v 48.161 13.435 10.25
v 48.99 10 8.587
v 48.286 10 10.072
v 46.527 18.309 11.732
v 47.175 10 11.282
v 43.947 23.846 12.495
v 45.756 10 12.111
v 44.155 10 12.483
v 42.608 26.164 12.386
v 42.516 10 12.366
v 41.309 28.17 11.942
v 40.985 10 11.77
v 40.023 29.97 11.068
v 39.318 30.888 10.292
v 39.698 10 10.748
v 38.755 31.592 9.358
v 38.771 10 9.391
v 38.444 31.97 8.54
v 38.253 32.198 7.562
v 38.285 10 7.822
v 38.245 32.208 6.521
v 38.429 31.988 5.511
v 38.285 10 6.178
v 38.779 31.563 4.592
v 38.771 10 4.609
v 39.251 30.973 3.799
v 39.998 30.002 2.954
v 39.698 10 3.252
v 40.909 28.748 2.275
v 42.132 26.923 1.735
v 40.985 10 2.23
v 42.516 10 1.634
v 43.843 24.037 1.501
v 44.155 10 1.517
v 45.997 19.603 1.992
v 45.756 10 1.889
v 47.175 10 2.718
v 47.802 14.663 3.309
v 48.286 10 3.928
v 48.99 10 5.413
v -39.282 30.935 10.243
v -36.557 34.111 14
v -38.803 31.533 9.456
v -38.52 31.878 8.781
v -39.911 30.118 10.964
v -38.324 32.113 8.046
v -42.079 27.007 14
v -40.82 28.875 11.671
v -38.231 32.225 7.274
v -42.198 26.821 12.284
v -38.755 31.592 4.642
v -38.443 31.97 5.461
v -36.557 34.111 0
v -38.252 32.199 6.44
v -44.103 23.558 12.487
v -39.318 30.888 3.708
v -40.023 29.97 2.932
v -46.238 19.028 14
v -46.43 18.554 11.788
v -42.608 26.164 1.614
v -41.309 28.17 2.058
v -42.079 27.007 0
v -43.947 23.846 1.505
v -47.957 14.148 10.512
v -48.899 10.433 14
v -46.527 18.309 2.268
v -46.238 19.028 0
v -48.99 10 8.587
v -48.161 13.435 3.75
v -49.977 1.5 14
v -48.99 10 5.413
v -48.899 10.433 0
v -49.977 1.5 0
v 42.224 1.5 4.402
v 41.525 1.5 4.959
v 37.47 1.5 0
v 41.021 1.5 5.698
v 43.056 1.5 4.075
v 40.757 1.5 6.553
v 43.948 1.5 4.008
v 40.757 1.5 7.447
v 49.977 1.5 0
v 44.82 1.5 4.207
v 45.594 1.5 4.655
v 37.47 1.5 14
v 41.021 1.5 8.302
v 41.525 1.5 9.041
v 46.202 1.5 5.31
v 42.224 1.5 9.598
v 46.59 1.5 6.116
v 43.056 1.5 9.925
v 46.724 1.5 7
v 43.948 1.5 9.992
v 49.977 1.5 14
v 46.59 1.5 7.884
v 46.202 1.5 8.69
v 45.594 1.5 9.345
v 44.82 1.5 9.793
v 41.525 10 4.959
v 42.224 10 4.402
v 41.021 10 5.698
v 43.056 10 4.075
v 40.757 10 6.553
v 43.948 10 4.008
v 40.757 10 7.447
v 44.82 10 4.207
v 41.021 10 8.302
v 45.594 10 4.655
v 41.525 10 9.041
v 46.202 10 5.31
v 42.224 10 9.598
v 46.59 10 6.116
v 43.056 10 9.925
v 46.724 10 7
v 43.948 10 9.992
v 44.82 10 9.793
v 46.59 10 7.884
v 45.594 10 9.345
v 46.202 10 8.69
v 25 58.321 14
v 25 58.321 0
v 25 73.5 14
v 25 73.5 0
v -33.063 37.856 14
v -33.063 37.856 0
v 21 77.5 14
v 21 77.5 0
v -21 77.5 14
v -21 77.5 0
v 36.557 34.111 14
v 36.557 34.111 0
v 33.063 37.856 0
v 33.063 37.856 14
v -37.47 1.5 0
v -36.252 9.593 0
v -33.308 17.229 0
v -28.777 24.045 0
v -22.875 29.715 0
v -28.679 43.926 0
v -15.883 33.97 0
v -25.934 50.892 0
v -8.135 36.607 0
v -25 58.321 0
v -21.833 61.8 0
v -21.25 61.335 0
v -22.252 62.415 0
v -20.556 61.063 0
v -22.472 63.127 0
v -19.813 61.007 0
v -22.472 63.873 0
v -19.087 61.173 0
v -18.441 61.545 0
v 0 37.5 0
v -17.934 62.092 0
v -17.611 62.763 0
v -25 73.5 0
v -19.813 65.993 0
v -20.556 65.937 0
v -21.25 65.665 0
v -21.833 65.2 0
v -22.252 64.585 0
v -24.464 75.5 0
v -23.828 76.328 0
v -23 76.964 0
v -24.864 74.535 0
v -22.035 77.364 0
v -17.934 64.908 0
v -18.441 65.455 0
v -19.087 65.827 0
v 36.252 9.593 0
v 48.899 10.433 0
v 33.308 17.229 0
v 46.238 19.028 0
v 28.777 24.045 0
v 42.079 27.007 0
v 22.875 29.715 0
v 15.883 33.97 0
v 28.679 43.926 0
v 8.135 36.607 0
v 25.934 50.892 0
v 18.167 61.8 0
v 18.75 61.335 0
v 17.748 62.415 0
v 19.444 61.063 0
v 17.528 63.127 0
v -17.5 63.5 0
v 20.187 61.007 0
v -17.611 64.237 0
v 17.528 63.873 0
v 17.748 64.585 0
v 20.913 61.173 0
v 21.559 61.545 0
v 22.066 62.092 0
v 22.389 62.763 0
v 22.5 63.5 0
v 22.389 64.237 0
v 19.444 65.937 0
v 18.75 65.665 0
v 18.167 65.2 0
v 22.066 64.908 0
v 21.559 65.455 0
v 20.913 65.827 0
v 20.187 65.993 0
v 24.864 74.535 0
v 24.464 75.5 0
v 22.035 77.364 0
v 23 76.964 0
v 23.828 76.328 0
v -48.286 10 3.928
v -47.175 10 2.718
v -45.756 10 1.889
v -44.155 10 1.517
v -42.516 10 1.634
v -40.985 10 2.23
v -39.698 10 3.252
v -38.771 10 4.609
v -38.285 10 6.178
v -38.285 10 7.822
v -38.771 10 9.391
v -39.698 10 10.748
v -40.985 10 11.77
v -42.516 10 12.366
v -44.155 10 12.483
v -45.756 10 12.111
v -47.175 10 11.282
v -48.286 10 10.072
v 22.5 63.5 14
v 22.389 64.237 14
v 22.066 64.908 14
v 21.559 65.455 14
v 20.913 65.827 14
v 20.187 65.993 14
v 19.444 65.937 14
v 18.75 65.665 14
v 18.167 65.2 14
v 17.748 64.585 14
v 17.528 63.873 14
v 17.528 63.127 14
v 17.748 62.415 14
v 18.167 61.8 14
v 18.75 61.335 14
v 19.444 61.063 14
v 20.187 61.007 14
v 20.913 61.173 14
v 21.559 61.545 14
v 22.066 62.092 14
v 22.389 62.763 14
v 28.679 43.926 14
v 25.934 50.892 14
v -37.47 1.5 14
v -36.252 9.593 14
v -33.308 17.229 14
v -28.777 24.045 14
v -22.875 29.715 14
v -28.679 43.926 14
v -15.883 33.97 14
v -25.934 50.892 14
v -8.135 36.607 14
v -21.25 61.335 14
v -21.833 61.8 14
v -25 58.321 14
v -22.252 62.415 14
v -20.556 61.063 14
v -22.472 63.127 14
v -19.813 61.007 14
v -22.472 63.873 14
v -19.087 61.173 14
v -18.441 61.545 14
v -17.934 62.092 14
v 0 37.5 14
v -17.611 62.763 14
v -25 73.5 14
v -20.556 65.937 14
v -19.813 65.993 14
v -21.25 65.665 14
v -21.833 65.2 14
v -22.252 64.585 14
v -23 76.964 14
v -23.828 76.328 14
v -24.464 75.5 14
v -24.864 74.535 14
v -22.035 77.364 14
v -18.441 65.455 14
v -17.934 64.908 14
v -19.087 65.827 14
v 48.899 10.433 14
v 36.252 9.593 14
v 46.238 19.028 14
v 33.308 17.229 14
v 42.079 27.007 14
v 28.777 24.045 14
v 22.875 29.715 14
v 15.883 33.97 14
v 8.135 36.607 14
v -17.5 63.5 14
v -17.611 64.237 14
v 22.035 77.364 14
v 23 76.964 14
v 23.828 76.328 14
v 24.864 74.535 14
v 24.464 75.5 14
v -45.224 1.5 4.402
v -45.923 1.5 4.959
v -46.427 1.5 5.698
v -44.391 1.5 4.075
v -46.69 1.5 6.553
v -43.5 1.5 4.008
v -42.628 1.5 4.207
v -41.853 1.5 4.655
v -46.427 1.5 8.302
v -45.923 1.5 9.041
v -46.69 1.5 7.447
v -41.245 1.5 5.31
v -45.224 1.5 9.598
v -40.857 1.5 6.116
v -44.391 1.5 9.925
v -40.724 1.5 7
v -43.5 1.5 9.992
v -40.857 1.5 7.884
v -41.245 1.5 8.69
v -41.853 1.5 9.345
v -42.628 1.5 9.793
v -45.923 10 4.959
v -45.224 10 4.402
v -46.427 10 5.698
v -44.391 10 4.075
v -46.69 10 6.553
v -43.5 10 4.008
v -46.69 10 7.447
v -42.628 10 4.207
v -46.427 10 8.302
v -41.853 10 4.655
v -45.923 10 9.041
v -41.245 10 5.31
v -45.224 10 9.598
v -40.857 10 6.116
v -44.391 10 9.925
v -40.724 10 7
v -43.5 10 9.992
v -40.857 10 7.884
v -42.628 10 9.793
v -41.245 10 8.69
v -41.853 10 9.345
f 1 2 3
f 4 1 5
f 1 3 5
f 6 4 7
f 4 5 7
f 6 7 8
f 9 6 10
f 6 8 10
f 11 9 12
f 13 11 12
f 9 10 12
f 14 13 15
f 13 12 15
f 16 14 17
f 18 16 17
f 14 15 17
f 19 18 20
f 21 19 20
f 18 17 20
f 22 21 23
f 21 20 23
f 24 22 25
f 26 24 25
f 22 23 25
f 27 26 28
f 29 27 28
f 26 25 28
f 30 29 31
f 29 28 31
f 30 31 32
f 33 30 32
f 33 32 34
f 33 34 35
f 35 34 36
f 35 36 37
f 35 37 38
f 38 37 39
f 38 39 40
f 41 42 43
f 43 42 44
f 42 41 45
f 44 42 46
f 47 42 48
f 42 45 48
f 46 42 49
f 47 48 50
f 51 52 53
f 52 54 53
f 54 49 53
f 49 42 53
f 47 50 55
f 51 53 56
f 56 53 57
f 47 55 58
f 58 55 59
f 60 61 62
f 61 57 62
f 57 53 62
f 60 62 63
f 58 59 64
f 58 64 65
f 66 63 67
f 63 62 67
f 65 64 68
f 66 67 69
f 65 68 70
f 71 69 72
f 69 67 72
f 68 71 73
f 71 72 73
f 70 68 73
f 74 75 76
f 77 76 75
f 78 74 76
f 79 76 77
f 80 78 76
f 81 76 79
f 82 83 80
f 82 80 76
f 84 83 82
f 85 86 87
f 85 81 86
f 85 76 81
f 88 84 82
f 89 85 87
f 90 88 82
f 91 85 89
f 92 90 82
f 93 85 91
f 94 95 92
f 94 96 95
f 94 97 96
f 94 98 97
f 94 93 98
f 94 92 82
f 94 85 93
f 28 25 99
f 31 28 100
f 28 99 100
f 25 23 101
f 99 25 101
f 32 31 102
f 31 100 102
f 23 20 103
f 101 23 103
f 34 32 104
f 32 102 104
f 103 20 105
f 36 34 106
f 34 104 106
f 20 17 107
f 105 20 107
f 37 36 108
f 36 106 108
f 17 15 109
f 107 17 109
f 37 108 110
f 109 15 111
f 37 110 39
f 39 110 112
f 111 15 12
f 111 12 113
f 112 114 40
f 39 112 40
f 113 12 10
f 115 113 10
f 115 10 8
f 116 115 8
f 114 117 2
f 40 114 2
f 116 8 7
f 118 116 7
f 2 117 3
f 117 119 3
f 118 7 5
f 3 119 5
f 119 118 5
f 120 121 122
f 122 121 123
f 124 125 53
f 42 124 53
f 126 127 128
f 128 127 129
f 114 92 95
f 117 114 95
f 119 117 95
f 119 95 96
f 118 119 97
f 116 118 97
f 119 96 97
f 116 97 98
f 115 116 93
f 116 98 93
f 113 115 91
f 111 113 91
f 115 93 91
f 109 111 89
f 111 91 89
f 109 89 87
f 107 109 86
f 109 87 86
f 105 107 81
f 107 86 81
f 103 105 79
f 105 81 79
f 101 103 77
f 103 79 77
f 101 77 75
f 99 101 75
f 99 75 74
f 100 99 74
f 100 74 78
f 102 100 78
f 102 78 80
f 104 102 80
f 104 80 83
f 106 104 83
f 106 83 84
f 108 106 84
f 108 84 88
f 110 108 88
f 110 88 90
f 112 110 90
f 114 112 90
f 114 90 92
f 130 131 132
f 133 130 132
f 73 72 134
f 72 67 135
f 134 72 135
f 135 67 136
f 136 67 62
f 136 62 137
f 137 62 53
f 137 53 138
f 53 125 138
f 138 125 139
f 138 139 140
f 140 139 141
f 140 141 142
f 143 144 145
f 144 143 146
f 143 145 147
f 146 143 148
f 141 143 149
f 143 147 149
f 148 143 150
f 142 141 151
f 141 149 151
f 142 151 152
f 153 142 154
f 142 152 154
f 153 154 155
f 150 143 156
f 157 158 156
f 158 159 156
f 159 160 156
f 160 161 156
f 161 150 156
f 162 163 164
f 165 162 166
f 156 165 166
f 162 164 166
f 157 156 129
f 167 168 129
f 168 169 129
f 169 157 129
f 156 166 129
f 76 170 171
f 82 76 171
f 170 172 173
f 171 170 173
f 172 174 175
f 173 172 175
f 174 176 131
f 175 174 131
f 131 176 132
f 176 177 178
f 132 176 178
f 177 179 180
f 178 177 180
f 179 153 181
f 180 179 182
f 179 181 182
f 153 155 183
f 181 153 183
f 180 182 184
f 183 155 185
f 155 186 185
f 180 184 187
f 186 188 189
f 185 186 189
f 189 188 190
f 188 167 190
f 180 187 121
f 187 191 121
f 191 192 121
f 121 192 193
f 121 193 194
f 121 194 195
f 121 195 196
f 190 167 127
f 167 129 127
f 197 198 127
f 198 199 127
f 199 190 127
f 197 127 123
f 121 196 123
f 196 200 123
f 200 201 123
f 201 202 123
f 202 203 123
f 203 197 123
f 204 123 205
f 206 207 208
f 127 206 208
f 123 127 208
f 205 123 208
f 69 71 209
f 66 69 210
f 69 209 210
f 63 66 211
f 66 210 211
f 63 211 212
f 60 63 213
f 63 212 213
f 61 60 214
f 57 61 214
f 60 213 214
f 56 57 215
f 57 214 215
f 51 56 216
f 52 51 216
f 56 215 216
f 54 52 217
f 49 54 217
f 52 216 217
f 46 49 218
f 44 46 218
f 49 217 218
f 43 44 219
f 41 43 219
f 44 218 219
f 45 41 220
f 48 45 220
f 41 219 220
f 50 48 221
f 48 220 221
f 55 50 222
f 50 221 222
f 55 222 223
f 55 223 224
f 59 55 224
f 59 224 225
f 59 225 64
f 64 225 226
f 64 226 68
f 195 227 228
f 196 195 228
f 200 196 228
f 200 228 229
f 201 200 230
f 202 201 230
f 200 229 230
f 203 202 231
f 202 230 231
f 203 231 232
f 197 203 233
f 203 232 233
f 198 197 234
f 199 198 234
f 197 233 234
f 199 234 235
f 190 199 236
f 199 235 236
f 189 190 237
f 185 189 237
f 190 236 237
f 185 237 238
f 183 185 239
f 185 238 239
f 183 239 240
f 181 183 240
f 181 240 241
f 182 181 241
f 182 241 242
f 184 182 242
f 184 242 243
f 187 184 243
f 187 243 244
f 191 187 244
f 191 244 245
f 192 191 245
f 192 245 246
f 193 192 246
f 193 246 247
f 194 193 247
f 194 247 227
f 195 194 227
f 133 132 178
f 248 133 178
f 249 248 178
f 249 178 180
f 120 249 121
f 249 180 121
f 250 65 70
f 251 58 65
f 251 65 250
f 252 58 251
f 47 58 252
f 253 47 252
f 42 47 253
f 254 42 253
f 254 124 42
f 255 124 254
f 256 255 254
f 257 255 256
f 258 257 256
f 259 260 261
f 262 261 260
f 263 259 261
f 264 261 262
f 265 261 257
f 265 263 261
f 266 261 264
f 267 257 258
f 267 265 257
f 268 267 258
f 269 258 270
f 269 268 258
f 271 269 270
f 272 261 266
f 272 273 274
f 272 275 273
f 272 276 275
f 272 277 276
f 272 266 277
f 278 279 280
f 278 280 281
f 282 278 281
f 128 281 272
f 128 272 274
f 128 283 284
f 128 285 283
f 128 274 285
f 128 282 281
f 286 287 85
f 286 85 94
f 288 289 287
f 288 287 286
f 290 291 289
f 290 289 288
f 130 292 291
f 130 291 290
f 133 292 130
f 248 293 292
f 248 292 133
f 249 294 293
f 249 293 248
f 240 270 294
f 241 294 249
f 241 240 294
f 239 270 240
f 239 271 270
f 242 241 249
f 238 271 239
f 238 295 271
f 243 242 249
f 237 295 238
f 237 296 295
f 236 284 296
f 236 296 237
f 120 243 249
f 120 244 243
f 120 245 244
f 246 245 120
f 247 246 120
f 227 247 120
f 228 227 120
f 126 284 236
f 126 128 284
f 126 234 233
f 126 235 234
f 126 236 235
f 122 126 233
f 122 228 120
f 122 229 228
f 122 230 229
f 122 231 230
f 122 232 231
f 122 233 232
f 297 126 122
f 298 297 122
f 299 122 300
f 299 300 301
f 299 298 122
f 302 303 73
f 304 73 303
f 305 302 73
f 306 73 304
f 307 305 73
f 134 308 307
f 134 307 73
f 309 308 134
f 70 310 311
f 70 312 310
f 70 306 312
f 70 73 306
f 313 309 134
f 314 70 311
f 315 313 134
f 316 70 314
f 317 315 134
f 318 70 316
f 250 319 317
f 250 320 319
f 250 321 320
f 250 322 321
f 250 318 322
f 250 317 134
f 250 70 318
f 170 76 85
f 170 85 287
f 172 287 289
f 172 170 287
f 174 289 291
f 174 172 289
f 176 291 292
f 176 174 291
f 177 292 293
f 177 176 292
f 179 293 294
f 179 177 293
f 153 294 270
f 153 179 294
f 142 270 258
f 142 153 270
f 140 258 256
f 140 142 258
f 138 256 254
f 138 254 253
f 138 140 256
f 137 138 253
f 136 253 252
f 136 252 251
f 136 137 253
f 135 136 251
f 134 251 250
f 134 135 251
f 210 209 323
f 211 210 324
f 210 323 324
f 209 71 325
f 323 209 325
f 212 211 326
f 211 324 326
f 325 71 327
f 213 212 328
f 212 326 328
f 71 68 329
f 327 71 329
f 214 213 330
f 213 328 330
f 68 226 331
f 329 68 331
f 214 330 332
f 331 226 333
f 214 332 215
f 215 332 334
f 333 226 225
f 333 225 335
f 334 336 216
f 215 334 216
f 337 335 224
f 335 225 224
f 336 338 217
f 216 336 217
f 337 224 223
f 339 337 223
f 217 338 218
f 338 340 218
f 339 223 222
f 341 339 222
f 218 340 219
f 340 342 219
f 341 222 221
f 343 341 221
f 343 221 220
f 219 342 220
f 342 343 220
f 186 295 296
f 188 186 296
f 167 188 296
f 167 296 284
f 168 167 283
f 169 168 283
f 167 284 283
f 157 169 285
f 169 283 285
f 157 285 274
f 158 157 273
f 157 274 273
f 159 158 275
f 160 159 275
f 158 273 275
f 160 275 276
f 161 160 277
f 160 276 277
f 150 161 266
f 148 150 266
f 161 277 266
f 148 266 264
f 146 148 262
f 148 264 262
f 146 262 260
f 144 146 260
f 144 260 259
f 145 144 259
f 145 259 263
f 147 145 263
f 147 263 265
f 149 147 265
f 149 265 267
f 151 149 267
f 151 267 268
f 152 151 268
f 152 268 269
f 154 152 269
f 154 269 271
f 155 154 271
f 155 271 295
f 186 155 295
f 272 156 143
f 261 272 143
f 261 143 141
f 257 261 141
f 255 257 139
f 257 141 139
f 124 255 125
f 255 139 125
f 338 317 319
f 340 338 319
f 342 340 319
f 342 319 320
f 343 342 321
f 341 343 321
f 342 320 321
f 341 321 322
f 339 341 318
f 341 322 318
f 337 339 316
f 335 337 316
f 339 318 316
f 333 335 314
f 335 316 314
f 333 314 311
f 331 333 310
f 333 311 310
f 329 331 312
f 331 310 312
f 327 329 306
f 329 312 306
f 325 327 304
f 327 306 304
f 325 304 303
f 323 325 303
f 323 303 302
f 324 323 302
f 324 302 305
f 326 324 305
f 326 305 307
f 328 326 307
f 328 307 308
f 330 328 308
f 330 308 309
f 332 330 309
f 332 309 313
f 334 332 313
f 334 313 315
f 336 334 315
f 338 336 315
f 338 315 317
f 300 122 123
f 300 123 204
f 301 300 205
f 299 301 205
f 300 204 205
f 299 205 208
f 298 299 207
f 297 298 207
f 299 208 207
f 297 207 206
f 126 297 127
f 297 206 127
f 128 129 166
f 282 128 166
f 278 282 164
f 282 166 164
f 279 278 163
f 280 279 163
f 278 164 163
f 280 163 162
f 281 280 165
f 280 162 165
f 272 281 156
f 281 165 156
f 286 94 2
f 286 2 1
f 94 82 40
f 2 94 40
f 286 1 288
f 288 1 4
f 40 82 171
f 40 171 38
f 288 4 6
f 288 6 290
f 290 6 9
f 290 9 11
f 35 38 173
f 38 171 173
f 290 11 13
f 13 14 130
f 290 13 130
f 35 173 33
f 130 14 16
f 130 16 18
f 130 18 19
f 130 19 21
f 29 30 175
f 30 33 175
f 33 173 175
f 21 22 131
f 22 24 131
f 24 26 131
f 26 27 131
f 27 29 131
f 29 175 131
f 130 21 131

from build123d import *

# Parameters (mm, degrees)
F0_R      = 50
F0_R_2    = 37.5
F1_DEPTH  = 14
F2_W      = 110
F2_H      = 64.89666
F3_DEPTH  = 14.001
F4_R      = 3
F5_DEPTH  = 50.001
F7_R      = 5.5
F8_DEPTH  = 25
F10_DEPTH = 14
F11_R     = 2.5
F12_DEPTH = 14.001


with BuildPart() as f1:
    # F0 (on Top) → F1 (new body)
    with BuildSketch(Plane.XY):
        Circle(F0_R)
        Circle(F0_R_2, mode=Mode.SUBTRACT)
    extrude(amount=F1_DEPTH)

    # F2 (on face) → F3 (cut, through all)
    with BuildSketch(Plane.XY.offset(14)):
        with Locations((0, -30.94833)):
            Rectangle(F2_W, F2_H)
    extrude(amount=-F3_DEPTH, mode=Mode.SUBTRACT)

    # F4 (on Front) → F5 (cut, through all)
    with BuildSketch(Plane.XZ):
        with Locations((-43.723741, 7)):
            Circle(F4_R)
        with Locations((43.723741, 7)):
            Circle(F4_R)
    extrude(amount=-F5_DEPTH, mode=Mode.SUBTRACT)

    # F7 (on offset) → F8 (cut)
    with BuildSketch(Plane.XZ.offset(-10)):
        with Locations((43.723741, 7)):
            Circle(F7_R)
        with Locations((-43.723741, 7)):
            Circle(F7_R)
    extrude(amount=-F8_DEPTH, mode=Mode.SUBTRACT)

    # F9 (on Top) → F10 (join, through all)
    with BuildSketch(Plane.XY):
        with BuildLine():
            ThreePointArc((25, 73.5), (23.828427, 76.328427), (21, 77.5))
            Line((21, 77.5), (-21, 77.5))
            ThreePointArc((-21, 77.5), (-23.828427, 76.328427), (-25, 73.5))
            Line((-25, 73.5), (-25, 58.320619))
            ThreePointArc((-25, 58.320619), (-27.088522, 47.322921), (-33.063292, 37.856484))
            Line((-33.063292, 37.856484), (-36.56118, 34.106892))
            Line((-36.56118, 34.106892), (0, 41.856416))
            Line((0, 41.856416), (36.56118, 34.106892))
            Line((36.56118, 34.106892), (33.063292, 37.856484))
            ThreePointArc((33.063292, 37.856484), (27.088522, 47.322921), (25, 58.320619))
            Line((25, 58.320619), (25, 73.5))
        make_face()
    extrude(amount=F10_DEPTH)

    # F11 (on face) → F12 (cut, through all)
    with BuildSketch(Plane.XY.offset(14)):
        with Locations((-20, 63.5)):
            Circle(F11_R)
        with Locations((20, 63.5)):
            Circle(F11_R)
    extrude(amount=-F12_DEPTH, mode=Mode.SUBTRACT)


solid = f1.part
